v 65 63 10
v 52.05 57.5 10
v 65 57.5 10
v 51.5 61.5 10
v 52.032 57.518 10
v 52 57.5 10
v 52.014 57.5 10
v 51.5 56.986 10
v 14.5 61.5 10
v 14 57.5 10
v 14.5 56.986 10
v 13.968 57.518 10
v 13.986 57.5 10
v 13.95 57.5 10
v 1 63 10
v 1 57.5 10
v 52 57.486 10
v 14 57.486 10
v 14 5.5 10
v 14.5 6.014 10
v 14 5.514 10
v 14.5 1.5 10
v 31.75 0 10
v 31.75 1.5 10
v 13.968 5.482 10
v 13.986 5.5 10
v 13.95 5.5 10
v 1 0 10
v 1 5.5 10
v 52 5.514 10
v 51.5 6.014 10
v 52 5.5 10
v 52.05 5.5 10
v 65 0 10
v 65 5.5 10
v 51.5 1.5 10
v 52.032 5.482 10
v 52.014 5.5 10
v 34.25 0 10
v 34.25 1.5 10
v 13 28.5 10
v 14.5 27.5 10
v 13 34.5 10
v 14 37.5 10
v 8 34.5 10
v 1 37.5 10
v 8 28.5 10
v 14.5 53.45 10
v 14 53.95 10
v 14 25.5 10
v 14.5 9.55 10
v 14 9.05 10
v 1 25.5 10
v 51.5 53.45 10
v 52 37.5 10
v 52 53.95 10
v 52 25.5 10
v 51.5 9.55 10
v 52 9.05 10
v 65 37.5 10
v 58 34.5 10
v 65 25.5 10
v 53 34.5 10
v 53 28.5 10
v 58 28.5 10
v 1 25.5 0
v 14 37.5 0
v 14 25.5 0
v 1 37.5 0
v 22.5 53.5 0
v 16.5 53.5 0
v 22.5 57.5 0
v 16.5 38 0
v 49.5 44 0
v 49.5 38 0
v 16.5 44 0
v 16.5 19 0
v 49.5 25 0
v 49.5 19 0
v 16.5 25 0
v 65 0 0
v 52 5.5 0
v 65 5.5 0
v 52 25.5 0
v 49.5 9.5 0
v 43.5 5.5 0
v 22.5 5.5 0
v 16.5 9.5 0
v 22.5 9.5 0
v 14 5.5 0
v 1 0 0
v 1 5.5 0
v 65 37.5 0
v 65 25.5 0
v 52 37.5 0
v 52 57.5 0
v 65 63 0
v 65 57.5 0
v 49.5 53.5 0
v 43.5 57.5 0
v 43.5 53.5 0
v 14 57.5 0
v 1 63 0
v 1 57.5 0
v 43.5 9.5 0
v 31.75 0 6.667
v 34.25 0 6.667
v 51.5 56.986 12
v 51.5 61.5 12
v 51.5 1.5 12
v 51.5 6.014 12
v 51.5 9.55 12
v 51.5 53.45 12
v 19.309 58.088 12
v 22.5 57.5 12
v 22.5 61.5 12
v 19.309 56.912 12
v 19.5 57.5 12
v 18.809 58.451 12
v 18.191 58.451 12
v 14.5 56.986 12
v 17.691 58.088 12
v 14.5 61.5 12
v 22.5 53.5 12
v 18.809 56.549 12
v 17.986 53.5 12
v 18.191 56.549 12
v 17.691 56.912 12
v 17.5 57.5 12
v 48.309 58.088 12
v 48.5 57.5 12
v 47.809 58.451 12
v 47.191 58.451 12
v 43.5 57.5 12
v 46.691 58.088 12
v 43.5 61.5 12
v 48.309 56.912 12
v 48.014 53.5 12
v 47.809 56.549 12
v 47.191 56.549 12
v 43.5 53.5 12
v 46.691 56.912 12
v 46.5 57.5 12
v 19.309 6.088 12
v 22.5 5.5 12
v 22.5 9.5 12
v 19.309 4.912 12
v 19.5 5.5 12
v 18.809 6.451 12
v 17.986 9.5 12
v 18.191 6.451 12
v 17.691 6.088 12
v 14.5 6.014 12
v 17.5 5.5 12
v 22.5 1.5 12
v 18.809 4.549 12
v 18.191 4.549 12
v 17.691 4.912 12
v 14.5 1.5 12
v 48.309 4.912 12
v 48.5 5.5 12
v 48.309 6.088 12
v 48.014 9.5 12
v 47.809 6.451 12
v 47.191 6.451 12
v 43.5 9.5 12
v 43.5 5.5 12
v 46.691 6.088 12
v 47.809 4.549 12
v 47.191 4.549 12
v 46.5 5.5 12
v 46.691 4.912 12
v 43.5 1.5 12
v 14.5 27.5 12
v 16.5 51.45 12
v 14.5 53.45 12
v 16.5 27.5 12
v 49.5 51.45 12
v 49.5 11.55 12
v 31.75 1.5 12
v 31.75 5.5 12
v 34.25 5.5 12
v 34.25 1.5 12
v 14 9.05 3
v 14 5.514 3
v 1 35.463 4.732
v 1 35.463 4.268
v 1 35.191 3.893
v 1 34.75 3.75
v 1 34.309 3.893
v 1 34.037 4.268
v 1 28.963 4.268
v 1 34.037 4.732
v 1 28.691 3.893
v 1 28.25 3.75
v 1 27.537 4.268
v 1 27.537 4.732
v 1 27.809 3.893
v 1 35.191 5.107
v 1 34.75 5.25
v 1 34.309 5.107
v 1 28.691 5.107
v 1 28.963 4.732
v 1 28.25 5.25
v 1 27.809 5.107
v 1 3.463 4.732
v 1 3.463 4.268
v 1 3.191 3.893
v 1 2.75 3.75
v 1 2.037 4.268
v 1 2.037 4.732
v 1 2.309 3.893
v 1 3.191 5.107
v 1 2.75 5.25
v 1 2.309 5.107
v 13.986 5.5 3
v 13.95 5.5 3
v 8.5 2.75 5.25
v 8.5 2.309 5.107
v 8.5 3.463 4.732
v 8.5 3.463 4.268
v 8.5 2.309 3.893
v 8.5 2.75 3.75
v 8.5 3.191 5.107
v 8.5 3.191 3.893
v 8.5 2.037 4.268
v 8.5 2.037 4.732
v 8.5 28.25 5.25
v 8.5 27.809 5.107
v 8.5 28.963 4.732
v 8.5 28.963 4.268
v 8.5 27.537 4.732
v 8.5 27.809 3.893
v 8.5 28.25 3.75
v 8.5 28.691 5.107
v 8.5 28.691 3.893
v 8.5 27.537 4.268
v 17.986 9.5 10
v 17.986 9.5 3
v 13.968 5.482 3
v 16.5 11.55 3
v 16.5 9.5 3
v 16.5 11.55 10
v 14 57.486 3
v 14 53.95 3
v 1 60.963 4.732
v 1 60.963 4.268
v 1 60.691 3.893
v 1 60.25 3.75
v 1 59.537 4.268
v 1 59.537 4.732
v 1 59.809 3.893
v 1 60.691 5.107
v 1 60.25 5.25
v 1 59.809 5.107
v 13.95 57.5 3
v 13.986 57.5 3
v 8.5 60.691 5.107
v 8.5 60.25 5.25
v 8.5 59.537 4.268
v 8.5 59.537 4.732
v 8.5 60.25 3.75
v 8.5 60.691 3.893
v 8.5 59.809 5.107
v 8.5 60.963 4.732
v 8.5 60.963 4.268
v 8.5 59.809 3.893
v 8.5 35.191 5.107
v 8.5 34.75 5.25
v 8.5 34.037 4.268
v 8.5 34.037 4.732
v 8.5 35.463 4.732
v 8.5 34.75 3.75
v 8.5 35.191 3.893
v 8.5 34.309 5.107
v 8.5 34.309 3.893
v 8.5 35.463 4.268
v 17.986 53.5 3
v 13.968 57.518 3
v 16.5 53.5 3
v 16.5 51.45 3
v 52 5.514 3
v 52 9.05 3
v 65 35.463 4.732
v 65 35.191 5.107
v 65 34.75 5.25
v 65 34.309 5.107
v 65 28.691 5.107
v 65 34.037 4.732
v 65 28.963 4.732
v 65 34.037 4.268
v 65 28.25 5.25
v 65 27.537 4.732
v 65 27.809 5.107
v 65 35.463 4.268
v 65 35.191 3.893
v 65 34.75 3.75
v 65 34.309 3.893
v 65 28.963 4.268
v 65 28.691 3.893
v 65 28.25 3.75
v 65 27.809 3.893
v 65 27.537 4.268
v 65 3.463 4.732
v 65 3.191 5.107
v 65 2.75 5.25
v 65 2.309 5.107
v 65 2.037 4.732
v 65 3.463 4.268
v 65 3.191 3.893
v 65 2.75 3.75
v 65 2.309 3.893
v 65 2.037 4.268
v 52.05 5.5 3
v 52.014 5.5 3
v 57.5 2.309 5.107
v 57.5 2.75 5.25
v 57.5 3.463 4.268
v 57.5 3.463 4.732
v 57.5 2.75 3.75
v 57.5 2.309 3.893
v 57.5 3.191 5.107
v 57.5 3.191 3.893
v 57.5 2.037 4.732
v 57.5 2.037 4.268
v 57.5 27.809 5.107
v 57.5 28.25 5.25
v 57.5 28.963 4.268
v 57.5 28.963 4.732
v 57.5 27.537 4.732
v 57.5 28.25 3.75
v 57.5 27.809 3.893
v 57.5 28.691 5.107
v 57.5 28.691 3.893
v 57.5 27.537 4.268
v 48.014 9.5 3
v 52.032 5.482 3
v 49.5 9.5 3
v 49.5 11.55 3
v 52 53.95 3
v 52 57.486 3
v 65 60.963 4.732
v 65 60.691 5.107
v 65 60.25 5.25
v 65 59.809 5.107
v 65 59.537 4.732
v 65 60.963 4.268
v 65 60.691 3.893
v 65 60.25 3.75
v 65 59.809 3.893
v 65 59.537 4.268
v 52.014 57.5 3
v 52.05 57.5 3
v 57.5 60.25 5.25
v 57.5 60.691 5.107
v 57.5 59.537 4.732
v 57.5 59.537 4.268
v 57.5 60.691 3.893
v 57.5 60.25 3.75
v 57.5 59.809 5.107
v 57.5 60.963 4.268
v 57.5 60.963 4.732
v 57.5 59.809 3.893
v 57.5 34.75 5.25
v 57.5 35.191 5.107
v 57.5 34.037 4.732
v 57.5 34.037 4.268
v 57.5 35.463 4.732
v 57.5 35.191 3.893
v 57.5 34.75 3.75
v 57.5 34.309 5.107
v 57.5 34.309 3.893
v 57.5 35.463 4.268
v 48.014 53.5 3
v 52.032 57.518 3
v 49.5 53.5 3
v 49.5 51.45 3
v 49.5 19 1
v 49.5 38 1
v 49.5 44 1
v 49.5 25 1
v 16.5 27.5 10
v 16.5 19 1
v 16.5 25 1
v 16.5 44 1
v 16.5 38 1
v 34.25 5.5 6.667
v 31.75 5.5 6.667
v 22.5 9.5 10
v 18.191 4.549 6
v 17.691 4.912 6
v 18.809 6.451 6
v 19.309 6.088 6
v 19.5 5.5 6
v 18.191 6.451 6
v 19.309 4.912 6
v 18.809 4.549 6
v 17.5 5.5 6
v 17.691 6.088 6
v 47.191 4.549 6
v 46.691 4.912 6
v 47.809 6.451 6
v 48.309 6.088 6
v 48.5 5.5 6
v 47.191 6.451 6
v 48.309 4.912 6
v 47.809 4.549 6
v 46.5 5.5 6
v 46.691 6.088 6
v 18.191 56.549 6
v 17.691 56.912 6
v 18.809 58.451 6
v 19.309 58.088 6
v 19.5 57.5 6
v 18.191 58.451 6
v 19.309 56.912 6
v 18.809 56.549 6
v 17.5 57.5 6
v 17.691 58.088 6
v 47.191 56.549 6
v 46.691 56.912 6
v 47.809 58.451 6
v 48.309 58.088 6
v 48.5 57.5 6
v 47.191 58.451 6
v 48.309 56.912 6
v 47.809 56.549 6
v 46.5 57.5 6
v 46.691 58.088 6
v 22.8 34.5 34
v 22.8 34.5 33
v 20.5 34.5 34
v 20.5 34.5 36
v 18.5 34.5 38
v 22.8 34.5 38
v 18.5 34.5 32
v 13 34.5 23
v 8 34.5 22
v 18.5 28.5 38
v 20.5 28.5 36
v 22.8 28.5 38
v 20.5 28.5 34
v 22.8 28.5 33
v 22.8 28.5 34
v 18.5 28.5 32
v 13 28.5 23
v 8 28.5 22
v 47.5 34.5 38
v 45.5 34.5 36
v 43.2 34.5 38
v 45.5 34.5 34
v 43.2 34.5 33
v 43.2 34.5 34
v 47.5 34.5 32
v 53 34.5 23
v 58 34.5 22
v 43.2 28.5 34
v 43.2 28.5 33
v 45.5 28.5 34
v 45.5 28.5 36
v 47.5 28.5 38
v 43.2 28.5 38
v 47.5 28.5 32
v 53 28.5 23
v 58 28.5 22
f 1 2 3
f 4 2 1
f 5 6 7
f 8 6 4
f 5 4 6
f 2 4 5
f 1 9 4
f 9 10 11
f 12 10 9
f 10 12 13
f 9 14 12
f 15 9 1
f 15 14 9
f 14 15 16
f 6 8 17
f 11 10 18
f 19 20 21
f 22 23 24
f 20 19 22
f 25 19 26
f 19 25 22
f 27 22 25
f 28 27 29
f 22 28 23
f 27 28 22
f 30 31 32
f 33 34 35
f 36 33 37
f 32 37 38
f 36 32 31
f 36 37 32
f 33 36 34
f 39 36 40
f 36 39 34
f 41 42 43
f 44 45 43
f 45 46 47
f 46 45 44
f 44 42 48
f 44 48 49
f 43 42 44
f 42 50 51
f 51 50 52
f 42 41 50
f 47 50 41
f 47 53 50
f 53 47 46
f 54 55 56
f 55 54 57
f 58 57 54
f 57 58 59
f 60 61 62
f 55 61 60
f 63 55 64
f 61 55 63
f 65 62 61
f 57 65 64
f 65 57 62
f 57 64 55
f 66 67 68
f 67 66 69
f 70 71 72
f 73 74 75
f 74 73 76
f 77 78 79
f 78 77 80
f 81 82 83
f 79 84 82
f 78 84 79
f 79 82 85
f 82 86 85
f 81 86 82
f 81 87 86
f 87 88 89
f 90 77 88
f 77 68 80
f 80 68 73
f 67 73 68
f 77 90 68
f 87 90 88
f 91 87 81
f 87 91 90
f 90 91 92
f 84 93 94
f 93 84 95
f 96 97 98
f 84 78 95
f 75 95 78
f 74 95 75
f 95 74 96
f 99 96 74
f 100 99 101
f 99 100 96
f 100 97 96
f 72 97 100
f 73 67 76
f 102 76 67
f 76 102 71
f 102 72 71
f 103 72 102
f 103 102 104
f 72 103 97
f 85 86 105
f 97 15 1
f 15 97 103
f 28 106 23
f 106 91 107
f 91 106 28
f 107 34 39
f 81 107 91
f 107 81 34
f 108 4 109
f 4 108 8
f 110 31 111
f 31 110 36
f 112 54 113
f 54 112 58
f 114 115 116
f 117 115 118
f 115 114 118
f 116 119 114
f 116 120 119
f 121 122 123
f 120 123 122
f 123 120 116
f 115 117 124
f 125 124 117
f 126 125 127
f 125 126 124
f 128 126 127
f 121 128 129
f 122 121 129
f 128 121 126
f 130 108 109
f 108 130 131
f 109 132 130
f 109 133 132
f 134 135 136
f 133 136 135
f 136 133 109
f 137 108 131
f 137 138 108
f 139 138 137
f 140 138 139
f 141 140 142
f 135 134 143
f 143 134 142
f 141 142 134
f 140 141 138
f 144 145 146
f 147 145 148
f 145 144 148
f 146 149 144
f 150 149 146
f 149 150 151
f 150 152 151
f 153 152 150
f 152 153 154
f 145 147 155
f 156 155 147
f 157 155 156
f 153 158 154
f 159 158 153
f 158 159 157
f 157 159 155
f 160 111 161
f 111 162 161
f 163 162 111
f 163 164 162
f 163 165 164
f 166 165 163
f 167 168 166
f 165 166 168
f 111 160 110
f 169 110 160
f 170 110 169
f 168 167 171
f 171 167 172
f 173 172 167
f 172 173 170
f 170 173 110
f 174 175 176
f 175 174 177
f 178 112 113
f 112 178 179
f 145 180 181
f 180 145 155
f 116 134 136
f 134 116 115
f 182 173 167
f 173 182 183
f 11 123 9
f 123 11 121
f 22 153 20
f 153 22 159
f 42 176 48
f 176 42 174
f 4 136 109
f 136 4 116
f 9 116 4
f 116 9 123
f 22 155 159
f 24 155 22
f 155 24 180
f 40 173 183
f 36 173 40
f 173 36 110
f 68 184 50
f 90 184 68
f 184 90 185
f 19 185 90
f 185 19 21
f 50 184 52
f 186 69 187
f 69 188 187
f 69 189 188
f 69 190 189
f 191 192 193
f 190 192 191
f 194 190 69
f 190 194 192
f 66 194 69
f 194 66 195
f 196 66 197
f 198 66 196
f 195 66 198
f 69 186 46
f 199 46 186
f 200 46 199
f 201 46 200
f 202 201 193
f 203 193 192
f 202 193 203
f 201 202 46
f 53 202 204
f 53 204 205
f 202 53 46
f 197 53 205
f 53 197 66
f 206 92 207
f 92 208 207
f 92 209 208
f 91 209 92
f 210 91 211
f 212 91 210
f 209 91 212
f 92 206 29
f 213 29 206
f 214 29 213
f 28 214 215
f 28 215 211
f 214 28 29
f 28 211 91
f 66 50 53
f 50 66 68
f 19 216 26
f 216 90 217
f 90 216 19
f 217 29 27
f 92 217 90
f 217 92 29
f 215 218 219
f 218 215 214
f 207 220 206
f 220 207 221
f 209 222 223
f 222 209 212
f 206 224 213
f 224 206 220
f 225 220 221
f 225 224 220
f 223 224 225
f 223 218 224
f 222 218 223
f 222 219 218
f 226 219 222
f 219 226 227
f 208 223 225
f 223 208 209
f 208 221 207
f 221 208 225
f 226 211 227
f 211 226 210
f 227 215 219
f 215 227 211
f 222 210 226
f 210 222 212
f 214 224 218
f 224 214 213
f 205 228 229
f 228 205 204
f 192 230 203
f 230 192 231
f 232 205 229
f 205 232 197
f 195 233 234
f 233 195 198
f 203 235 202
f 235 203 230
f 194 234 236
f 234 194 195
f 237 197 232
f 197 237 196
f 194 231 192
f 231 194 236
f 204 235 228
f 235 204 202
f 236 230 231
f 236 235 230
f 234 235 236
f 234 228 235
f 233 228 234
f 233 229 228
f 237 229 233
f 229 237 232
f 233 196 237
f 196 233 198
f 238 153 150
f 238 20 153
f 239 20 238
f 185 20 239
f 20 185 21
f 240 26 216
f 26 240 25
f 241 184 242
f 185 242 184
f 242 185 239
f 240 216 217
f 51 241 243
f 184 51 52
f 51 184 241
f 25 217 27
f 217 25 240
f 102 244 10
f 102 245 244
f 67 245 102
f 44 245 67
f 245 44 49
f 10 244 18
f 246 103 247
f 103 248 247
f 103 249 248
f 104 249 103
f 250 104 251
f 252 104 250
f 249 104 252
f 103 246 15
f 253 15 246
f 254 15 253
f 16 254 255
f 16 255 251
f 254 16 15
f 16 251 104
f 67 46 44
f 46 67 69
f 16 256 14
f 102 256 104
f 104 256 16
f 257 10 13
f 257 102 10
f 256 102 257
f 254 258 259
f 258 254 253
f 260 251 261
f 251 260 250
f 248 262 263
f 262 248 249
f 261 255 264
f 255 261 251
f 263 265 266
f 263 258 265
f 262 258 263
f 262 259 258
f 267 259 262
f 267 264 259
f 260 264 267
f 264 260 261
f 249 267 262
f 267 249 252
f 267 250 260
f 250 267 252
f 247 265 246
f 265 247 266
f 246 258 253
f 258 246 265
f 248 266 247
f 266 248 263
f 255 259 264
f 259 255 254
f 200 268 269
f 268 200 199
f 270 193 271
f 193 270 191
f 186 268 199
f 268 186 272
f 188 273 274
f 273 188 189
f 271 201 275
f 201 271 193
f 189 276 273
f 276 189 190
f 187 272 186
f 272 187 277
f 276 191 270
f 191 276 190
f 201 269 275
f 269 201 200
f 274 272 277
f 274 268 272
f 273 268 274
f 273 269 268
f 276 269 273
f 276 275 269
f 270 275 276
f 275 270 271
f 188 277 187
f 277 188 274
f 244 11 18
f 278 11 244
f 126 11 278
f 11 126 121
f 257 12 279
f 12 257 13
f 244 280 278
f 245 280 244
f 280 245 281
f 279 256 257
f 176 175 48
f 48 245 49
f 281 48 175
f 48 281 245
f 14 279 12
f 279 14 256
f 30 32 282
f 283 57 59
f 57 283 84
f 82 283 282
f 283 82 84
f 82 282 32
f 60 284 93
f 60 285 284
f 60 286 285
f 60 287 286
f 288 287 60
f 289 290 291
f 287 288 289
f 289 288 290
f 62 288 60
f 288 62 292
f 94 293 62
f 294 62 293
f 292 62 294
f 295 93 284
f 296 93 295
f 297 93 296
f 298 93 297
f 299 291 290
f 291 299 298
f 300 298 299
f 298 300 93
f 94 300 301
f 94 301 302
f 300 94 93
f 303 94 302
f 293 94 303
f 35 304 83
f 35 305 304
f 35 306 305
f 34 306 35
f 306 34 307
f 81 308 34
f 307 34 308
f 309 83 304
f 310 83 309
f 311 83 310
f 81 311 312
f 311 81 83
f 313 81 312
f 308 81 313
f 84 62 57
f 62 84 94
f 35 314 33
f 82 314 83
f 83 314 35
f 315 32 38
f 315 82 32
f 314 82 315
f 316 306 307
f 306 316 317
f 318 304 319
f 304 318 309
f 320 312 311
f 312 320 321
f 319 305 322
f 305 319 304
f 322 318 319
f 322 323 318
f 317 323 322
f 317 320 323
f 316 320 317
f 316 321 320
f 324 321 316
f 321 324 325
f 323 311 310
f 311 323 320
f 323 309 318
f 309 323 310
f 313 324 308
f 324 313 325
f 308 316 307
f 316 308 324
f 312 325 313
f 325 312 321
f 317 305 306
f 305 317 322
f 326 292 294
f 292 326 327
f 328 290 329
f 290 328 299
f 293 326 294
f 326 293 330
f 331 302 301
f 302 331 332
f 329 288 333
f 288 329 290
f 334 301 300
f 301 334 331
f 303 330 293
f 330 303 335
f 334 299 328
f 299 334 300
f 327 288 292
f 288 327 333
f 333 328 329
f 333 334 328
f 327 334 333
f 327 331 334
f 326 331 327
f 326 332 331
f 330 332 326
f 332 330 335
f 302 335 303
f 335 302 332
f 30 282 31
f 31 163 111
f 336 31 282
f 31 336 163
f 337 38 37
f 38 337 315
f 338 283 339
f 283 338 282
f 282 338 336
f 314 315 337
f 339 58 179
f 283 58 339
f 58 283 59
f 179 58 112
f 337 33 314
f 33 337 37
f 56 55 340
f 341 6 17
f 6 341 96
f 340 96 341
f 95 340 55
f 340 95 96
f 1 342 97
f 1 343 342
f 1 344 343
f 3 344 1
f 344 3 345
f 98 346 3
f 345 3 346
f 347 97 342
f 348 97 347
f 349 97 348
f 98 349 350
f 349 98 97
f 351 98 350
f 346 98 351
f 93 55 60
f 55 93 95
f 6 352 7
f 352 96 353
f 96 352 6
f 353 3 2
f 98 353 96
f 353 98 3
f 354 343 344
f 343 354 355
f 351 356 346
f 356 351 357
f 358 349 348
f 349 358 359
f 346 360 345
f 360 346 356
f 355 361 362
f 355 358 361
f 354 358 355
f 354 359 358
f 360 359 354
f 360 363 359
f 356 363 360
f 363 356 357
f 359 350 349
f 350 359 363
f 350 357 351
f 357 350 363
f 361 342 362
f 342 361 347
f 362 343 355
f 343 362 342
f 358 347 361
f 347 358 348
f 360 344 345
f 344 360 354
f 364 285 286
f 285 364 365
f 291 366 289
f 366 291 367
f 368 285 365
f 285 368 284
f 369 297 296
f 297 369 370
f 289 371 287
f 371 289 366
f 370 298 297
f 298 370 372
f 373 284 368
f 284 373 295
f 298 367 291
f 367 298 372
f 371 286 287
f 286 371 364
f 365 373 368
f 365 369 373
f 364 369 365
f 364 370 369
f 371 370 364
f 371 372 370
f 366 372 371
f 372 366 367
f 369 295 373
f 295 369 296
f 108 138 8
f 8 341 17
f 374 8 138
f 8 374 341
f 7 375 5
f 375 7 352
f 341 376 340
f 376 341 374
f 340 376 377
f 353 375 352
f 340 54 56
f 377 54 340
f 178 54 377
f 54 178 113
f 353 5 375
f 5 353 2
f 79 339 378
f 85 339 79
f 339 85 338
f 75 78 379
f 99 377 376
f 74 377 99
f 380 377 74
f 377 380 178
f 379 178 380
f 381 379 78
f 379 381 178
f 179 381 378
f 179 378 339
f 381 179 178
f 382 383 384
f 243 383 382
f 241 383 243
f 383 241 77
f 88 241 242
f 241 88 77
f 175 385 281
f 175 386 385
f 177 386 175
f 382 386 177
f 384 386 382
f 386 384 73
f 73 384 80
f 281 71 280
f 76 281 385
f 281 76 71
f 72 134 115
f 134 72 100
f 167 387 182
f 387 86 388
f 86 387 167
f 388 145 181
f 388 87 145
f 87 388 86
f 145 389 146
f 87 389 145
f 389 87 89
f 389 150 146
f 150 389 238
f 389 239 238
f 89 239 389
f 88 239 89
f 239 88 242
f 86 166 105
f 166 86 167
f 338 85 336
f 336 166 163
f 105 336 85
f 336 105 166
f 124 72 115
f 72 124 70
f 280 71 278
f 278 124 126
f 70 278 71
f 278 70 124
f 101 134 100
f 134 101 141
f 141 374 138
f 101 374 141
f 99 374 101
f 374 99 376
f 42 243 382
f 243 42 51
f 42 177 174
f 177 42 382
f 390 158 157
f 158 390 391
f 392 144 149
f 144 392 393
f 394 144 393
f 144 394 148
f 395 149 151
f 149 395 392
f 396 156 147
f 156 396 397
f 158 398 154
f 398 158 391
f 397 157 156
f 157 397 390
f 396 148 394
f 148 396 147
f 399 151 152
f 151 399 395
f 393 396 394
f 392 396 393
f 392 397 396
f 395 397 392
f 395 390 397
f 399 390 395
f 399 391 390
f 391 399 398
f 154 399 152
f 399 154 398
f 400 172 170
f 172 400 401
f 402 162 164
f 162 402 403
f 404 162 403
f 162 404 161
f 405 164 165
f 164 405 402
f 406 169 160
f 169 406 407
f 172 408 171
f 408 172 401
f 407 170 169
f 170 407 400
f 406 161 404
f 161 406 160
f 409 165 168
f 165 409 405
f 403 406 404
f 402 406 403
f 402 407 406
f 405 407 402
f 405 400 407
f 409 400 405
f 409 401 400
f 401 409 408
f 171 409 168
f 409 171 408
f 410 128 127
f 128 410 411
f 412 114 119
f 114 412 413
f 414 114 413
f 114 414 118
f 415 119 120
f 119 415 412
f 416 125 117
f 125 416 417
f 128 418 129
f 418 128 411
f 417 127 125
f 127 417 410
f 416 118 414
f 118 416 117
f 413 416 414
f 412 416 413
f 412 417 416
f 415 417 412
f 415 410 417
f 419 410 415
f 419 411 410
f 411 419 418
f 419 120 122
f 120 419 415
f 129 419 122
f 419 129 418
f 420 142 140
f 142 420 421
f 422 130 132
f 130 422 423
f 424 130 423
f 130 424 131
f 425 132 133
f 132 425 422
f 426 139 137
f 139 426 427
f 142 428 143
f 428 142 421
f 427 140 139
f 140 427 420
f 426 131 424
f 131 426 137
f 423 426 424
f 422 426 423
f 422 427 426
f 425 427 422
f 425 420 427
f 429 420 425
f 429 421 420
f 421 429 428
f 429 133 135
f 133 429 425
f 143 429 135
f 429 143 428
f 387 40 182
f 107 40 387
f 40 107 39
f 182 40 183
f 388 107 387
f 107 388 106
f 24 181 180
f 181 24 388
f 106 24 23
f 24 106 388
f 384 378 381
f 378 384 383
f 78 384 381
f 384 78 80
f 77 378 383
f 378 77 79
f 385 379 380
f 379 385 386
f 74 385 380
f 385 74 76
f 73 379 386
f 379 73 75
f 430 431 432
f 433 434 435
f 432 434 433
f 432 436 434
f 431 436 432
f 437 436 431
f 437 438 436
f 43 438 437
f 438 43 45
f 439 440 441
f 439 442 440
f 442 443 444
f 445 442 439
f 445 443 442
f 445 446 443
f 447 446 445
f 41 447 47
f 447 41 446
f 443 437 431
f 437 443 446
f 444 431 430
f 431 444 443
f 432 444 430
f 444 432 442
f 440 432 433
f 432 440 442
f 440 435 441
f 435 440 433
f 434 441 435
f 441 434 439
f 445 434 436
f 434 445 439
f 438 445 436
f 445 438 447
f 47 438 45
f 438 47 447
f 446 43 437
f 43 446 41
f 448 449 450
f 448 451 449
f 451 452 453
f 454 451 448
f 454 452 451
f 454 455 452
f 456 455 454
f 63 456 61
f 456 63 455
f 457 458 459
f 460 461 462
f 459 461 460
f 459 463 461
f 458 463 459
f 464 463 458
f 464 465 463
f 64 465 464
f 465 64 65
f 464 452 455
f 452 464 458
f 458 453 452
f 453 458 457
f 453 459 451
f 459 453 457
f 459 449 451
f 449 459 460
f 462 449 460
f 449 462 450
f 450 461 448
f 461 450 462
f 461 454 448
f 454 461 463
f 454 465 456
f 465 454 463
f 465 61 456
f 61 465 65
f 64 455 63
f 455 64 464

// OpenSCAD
    // frame for short four-legged robot
    // History:
    // v1: Fusion360, check 01_trivial dir
    // v2: openscad: 
    //     - inverted servos support
    //     - solid holder for IMU unit
    
    // servo motor GH-S37A
    SERVO_WIDTH = 13;
    SERVO_LENGTH = 20;
    SERVO_THICK = 9;
    SERVO_EARS_LENGTH = 5.5;
    SERVO_EARS_THICK = 1;
    SERVO_HOLE_LENGTH = 7.5;
    SERVO_HOLE_D = 1.5;
    SERVO_WIRE_THICK = 2.5;
    SERVO_WIRE_LENGTH = 10;
    
    module servo(up_extrude = 1) {
        cube([SERVO_WIDTH, SERVO_LENGTH, SERVO_THICK*up_extrude]);
        translate([-SERVO_EARS_THICK, -SERVO_EARS_LENGTH, 0])
        cube([SERVO_EARS_THICK, (SERVO_EARS_LENGTH+0.5)*2 + SERVO_LENGTH, SERVO_THICK*up_extrude]);
    
        translate([-SERVO_EARS_THICK*2, -(SERVO_EARS_LENGTH)/2, SERVO_THICK/2])
        rotate([0, 90, 0])
        cylinder(SERVO_HOLE_LENGTH + SERVO_EARS_THICK*2, d=SERVO_HOLE_D, $fn=10);
    
        translate([-SERVO_EARS_THICK*2, SERVO_LENGTH + SERVO_EARS_LENGTH/2, SERVO_THICK/2])
        rotate([0, 90, 0])
        cylinder(SERVO_HOLE_LENGTH + SERVO_EARS_THICK*2, d=SERVO_HOLE_D, $fn=10);
        
        // cable
        translate([SERVO_WIDTH-SERVO_WIRE_THICK+0.7, SERVO_WIRE_THICK/2+.5, SERVO_THICK/3])
        rotate([0, 0, -45])
        cube([SERVO_WIRE_THICK, SERVO_WIRE_LENGTH, SERVO_THICK*2]);
    }
    
    
    BOARD_LENGTH = 60;
    BOARD_WIDTH = 37;
    BOARD_THICK = 2;
    BOARD_HOLE_D = 2;
    BOARD_HOLE_OFS = 4;
    BOARD_HOLE_LENGTH = 10;
    BOARD_HOLE_BASE = 8;
    
    BOARD_DOWN_LENGTH = 52;
    BOARD_DOWN_WIDTH = 33;
    BOARD_DOWN_DEPTH = 17;
    
    BOARD_SD_WIDTH = 15;
    BOARD_SD_LENGTH = 18;
    BOARD_SD_THICK = 3;
    BOARD_SD_Y_OFS = 8;
    
    module board(up_extrude = 1) {
        difference() {
            union() {
                cube([BOARD_WIDTH, BOARD_LENGTH, BOARD_THICK*up_extrude]);
                translate([(BOARD_WIDTH - BOARD_DOWN_WIDTH)/2, 
                    (BOARD_LENGTH - BOARD_DOWN_LENGTH)/2, -BOARD_DOWN_DEPTH])
                cube([BOARD_DOWN_WIDTH, BOARD_DOWN_LENGTH, BOARD_DOWN_DEPTH]);
            }
            
            translate([0, 0, -BOARD_DOWN_DEPTH]) {
                cube([BOARD_HOLE_BASE, BOARD_HOLE_BASE, BOARD_DOWN_DEPTH]);
                
                translate([BOARD_WIDTH - BOARD_HOLE_BASE, 0, 0])
                cube([BOARD_HOLE_BASE, BOARD_HOLE_BASE, BOARD_DOWN_DEPTH]);
    
                translate([0, BOARD_LENGTH - BOARD_HOLE_BASE, 0])
                cube([BOARD_HOLE_BASE, BOARD_HOLE_BASE, BOARD_DOWN_DEPTH]);
    
                translate([BOARD_WIDTH - BOARD_HOLE_BASE, BOARD_LENGTH - BOARD_HOLE_BASE, 0])
                cube([BOARD_HOLE_BASE, BOARD_HOLE_BASE, BOARD_DOWN_DEPTH]);
            }
        }
    
        translate([0, BOARD_SD_Y_OFS, -BOARD_THICK])
        cube([BOARD_SD_WIDTH, BOARD_SD_LENGTH, BOARD_SD_THICK]);
        
        translate([BOARD_HOLE_OFS, BOARD_HOLE_OFS, -BOARD_HOLE_LENGTH+BOARD_THICK*2])
        cylinder(BOARD_HOLE_LENGTH, d=BOARD_HOLE_D, $fn=10);
    
        translate([BOARD_WIDTH-BOARD_HOLE_OFS, BOARD_HOLE_OFS, -BOARD_HOLE_LENGTH+BOARD_THICK*2])
        cylinder(BOARD_HOLE_LENGTH, d=BOARD_HOLE_D, $fn=10);
    
        translate([BOARD_HOLE_OFS, BOARD_LENGTH-BOARD_HOLE_OFS, -BOARD_HOLE_LENGTH+BOARD_THICK*2])
        cylinder(BOARD_HOLE_LENGTH, d=BOARD_HOLE_D, $fn=10);
    
        translate([BOARD_WIDTH-BOARD_HOLE_OFS, BOARD_LENGTH-BOARD_HOLE_OFS, -BOARD_HOLE_LENGTH+BOARD_THICK*2])
        cylinder(BOARD_HOLE_LENGTH, d=BOARD_HOLE_D, $fn=10);
    }
    
    
    
    // Frame base with servo and board placement
    BASE_LENGTH = 63;
    BASE_WIDTH = 66;
    BASE_THICK = 10;
    BASE_UNDER_SERVO_DIM = 0;
    BASE_BOARD_Z_OFS = BASE_THICK + 2;
    
    BASE_WIRE_LENGTH = 6;
    BASE_WIRE_THICK = 1;
    
    
    module frame_base() {
        board_ofs_x = (BASE_WIDTH - BOARD_WIDTH)/2;
        board_ofs_y = (BASE_LENGTH - BOARD_LENGTH)/2;
        
        difference() {
            union() {
                cube([BASE_WIDTH, BASE_LENGTH, BASE_THICK]);
                translate([board_ofs_x, board_ofs_y, 0])
                cube([BOARD_WIDTH, BOARD_LENGTH, BASE_BOARD_Z_OFS]);
            }
            
            translate([SERVO_EARS_THICK, SERVO_EARS_LENGTH, BASE_UNDER_SERVO_DIM])
            servo(up_extrude=3);
            
            translate([SERVO_EARS_THICK, BASE_LENGTH-SERVO_EARS_LENGTH, BASE_UNDER_SERVO_DIM])
            mirror([0, 1, 0])
            servo(up_extrude=3);
    
            translate([BASE_WIDTH, 0, 0])
            mirror([1, 0, 0]) {
                translate([SERVO_EARS_THICK, SERVO_EARS_LENGTH, BASE_UNDER_SERVO_DIM])
                servo(up_extrude=3);
                mirror([0, 1, 0])
                translate([SERVO_EARS_THICK, -BASE_LENGTH+SERVO_EARS_LENGTH, BASE_UNDER_SERVO_DIM])
                servo(up_extrude=3);
            }
    
            // board
            translate([board_ofs_x, board_ofs_y, BASE_BOARD_Z_OFS])
            board(1);
            
            // wire hole
            translate([(BASE_WIDTH - SERVO_WIRE_THICK)/2, -1, BASE_THICK*2/3])
            cube([SERVO_WIRE_THICK, 10, BASE_THICK]);
        }
        
        // wire supports
        translate([board_ofs_x, (BASE_LENGTH-BASE_WIRE_LENGTH)/3, 0])
        cube([BOARD_WIDTH, BASE_WIRE_LENGTH, BASE_WIRE_THICK]);
    
        translate([board_ofs_x, (BASE_LENGTH-BASE_WIRE_LENGTH)*2/3, 0])
        cube([BOARD_WIDTH, BASE_WIRE_LENGTH, BASE_WIRE_THICK]);
    }
    
    
    module imu_holder(thickness) {
        // grip offsets
        y = 5;
        x = 1.5;
        linear_extrude(thickness)
        translate([5, 14])
        polygon([
            [1, -2],
            [1, -14], [6, -14],
            [6, -1], [17.3-x, 14-y], [17.3-x, 15-y], [15-x, 15-y],
            [15-x, 17-y], [17.3-x, 19-y], [13-x, 19-y], [13-x, 13-y]
        ]);
    }
    
    
    FRAME_IMU_THICK = 6;
    FRAME_IMU_X_OFS = 2;
    
    
    module frame() {
        frame_base();
        
        imu_y_ofs = (BASE_LENGTH + FRAME_IMU_THICK)/2;
        
        translate([FRAME_IMU_X_OFS, imu_y_ofs, BASE_THICK])
        rotate([90, 0, 0])
        imu_holder(FRAME_IMU_THICK);
    
        translate([BASE_WIDTH - FRAME_IMU_X_OFS, imu_y_ofs, BASE_THICK])
        mirror([1, 0, 0])
        rotate([90, 0, 0])
        imu_holder(FRAME_IMU_THICK);
    }
    
    
    IMU_WIDTH = 25.4;
    IMU_LENGTH = 25.6;
    IMU_THICK = 1.7;
    
    module imu_board() {
        x_ofs = (BASE_WIDTH - IMU_WIDTH)/2;
        y_ofs = (BASE_LENGTH - IMU_LENGTH)/2;
        
        translate([x_ofs, y_ofs, 34])
        cube([IMU_WIDTH, IMU_LENGTH, IMU_THICK]);
    }
    
    
    //frame_base();
    //imu_holder(FRAME_IMU_THICK);
    //board();
    //servo();
    frame();
    
    //imu_board();
